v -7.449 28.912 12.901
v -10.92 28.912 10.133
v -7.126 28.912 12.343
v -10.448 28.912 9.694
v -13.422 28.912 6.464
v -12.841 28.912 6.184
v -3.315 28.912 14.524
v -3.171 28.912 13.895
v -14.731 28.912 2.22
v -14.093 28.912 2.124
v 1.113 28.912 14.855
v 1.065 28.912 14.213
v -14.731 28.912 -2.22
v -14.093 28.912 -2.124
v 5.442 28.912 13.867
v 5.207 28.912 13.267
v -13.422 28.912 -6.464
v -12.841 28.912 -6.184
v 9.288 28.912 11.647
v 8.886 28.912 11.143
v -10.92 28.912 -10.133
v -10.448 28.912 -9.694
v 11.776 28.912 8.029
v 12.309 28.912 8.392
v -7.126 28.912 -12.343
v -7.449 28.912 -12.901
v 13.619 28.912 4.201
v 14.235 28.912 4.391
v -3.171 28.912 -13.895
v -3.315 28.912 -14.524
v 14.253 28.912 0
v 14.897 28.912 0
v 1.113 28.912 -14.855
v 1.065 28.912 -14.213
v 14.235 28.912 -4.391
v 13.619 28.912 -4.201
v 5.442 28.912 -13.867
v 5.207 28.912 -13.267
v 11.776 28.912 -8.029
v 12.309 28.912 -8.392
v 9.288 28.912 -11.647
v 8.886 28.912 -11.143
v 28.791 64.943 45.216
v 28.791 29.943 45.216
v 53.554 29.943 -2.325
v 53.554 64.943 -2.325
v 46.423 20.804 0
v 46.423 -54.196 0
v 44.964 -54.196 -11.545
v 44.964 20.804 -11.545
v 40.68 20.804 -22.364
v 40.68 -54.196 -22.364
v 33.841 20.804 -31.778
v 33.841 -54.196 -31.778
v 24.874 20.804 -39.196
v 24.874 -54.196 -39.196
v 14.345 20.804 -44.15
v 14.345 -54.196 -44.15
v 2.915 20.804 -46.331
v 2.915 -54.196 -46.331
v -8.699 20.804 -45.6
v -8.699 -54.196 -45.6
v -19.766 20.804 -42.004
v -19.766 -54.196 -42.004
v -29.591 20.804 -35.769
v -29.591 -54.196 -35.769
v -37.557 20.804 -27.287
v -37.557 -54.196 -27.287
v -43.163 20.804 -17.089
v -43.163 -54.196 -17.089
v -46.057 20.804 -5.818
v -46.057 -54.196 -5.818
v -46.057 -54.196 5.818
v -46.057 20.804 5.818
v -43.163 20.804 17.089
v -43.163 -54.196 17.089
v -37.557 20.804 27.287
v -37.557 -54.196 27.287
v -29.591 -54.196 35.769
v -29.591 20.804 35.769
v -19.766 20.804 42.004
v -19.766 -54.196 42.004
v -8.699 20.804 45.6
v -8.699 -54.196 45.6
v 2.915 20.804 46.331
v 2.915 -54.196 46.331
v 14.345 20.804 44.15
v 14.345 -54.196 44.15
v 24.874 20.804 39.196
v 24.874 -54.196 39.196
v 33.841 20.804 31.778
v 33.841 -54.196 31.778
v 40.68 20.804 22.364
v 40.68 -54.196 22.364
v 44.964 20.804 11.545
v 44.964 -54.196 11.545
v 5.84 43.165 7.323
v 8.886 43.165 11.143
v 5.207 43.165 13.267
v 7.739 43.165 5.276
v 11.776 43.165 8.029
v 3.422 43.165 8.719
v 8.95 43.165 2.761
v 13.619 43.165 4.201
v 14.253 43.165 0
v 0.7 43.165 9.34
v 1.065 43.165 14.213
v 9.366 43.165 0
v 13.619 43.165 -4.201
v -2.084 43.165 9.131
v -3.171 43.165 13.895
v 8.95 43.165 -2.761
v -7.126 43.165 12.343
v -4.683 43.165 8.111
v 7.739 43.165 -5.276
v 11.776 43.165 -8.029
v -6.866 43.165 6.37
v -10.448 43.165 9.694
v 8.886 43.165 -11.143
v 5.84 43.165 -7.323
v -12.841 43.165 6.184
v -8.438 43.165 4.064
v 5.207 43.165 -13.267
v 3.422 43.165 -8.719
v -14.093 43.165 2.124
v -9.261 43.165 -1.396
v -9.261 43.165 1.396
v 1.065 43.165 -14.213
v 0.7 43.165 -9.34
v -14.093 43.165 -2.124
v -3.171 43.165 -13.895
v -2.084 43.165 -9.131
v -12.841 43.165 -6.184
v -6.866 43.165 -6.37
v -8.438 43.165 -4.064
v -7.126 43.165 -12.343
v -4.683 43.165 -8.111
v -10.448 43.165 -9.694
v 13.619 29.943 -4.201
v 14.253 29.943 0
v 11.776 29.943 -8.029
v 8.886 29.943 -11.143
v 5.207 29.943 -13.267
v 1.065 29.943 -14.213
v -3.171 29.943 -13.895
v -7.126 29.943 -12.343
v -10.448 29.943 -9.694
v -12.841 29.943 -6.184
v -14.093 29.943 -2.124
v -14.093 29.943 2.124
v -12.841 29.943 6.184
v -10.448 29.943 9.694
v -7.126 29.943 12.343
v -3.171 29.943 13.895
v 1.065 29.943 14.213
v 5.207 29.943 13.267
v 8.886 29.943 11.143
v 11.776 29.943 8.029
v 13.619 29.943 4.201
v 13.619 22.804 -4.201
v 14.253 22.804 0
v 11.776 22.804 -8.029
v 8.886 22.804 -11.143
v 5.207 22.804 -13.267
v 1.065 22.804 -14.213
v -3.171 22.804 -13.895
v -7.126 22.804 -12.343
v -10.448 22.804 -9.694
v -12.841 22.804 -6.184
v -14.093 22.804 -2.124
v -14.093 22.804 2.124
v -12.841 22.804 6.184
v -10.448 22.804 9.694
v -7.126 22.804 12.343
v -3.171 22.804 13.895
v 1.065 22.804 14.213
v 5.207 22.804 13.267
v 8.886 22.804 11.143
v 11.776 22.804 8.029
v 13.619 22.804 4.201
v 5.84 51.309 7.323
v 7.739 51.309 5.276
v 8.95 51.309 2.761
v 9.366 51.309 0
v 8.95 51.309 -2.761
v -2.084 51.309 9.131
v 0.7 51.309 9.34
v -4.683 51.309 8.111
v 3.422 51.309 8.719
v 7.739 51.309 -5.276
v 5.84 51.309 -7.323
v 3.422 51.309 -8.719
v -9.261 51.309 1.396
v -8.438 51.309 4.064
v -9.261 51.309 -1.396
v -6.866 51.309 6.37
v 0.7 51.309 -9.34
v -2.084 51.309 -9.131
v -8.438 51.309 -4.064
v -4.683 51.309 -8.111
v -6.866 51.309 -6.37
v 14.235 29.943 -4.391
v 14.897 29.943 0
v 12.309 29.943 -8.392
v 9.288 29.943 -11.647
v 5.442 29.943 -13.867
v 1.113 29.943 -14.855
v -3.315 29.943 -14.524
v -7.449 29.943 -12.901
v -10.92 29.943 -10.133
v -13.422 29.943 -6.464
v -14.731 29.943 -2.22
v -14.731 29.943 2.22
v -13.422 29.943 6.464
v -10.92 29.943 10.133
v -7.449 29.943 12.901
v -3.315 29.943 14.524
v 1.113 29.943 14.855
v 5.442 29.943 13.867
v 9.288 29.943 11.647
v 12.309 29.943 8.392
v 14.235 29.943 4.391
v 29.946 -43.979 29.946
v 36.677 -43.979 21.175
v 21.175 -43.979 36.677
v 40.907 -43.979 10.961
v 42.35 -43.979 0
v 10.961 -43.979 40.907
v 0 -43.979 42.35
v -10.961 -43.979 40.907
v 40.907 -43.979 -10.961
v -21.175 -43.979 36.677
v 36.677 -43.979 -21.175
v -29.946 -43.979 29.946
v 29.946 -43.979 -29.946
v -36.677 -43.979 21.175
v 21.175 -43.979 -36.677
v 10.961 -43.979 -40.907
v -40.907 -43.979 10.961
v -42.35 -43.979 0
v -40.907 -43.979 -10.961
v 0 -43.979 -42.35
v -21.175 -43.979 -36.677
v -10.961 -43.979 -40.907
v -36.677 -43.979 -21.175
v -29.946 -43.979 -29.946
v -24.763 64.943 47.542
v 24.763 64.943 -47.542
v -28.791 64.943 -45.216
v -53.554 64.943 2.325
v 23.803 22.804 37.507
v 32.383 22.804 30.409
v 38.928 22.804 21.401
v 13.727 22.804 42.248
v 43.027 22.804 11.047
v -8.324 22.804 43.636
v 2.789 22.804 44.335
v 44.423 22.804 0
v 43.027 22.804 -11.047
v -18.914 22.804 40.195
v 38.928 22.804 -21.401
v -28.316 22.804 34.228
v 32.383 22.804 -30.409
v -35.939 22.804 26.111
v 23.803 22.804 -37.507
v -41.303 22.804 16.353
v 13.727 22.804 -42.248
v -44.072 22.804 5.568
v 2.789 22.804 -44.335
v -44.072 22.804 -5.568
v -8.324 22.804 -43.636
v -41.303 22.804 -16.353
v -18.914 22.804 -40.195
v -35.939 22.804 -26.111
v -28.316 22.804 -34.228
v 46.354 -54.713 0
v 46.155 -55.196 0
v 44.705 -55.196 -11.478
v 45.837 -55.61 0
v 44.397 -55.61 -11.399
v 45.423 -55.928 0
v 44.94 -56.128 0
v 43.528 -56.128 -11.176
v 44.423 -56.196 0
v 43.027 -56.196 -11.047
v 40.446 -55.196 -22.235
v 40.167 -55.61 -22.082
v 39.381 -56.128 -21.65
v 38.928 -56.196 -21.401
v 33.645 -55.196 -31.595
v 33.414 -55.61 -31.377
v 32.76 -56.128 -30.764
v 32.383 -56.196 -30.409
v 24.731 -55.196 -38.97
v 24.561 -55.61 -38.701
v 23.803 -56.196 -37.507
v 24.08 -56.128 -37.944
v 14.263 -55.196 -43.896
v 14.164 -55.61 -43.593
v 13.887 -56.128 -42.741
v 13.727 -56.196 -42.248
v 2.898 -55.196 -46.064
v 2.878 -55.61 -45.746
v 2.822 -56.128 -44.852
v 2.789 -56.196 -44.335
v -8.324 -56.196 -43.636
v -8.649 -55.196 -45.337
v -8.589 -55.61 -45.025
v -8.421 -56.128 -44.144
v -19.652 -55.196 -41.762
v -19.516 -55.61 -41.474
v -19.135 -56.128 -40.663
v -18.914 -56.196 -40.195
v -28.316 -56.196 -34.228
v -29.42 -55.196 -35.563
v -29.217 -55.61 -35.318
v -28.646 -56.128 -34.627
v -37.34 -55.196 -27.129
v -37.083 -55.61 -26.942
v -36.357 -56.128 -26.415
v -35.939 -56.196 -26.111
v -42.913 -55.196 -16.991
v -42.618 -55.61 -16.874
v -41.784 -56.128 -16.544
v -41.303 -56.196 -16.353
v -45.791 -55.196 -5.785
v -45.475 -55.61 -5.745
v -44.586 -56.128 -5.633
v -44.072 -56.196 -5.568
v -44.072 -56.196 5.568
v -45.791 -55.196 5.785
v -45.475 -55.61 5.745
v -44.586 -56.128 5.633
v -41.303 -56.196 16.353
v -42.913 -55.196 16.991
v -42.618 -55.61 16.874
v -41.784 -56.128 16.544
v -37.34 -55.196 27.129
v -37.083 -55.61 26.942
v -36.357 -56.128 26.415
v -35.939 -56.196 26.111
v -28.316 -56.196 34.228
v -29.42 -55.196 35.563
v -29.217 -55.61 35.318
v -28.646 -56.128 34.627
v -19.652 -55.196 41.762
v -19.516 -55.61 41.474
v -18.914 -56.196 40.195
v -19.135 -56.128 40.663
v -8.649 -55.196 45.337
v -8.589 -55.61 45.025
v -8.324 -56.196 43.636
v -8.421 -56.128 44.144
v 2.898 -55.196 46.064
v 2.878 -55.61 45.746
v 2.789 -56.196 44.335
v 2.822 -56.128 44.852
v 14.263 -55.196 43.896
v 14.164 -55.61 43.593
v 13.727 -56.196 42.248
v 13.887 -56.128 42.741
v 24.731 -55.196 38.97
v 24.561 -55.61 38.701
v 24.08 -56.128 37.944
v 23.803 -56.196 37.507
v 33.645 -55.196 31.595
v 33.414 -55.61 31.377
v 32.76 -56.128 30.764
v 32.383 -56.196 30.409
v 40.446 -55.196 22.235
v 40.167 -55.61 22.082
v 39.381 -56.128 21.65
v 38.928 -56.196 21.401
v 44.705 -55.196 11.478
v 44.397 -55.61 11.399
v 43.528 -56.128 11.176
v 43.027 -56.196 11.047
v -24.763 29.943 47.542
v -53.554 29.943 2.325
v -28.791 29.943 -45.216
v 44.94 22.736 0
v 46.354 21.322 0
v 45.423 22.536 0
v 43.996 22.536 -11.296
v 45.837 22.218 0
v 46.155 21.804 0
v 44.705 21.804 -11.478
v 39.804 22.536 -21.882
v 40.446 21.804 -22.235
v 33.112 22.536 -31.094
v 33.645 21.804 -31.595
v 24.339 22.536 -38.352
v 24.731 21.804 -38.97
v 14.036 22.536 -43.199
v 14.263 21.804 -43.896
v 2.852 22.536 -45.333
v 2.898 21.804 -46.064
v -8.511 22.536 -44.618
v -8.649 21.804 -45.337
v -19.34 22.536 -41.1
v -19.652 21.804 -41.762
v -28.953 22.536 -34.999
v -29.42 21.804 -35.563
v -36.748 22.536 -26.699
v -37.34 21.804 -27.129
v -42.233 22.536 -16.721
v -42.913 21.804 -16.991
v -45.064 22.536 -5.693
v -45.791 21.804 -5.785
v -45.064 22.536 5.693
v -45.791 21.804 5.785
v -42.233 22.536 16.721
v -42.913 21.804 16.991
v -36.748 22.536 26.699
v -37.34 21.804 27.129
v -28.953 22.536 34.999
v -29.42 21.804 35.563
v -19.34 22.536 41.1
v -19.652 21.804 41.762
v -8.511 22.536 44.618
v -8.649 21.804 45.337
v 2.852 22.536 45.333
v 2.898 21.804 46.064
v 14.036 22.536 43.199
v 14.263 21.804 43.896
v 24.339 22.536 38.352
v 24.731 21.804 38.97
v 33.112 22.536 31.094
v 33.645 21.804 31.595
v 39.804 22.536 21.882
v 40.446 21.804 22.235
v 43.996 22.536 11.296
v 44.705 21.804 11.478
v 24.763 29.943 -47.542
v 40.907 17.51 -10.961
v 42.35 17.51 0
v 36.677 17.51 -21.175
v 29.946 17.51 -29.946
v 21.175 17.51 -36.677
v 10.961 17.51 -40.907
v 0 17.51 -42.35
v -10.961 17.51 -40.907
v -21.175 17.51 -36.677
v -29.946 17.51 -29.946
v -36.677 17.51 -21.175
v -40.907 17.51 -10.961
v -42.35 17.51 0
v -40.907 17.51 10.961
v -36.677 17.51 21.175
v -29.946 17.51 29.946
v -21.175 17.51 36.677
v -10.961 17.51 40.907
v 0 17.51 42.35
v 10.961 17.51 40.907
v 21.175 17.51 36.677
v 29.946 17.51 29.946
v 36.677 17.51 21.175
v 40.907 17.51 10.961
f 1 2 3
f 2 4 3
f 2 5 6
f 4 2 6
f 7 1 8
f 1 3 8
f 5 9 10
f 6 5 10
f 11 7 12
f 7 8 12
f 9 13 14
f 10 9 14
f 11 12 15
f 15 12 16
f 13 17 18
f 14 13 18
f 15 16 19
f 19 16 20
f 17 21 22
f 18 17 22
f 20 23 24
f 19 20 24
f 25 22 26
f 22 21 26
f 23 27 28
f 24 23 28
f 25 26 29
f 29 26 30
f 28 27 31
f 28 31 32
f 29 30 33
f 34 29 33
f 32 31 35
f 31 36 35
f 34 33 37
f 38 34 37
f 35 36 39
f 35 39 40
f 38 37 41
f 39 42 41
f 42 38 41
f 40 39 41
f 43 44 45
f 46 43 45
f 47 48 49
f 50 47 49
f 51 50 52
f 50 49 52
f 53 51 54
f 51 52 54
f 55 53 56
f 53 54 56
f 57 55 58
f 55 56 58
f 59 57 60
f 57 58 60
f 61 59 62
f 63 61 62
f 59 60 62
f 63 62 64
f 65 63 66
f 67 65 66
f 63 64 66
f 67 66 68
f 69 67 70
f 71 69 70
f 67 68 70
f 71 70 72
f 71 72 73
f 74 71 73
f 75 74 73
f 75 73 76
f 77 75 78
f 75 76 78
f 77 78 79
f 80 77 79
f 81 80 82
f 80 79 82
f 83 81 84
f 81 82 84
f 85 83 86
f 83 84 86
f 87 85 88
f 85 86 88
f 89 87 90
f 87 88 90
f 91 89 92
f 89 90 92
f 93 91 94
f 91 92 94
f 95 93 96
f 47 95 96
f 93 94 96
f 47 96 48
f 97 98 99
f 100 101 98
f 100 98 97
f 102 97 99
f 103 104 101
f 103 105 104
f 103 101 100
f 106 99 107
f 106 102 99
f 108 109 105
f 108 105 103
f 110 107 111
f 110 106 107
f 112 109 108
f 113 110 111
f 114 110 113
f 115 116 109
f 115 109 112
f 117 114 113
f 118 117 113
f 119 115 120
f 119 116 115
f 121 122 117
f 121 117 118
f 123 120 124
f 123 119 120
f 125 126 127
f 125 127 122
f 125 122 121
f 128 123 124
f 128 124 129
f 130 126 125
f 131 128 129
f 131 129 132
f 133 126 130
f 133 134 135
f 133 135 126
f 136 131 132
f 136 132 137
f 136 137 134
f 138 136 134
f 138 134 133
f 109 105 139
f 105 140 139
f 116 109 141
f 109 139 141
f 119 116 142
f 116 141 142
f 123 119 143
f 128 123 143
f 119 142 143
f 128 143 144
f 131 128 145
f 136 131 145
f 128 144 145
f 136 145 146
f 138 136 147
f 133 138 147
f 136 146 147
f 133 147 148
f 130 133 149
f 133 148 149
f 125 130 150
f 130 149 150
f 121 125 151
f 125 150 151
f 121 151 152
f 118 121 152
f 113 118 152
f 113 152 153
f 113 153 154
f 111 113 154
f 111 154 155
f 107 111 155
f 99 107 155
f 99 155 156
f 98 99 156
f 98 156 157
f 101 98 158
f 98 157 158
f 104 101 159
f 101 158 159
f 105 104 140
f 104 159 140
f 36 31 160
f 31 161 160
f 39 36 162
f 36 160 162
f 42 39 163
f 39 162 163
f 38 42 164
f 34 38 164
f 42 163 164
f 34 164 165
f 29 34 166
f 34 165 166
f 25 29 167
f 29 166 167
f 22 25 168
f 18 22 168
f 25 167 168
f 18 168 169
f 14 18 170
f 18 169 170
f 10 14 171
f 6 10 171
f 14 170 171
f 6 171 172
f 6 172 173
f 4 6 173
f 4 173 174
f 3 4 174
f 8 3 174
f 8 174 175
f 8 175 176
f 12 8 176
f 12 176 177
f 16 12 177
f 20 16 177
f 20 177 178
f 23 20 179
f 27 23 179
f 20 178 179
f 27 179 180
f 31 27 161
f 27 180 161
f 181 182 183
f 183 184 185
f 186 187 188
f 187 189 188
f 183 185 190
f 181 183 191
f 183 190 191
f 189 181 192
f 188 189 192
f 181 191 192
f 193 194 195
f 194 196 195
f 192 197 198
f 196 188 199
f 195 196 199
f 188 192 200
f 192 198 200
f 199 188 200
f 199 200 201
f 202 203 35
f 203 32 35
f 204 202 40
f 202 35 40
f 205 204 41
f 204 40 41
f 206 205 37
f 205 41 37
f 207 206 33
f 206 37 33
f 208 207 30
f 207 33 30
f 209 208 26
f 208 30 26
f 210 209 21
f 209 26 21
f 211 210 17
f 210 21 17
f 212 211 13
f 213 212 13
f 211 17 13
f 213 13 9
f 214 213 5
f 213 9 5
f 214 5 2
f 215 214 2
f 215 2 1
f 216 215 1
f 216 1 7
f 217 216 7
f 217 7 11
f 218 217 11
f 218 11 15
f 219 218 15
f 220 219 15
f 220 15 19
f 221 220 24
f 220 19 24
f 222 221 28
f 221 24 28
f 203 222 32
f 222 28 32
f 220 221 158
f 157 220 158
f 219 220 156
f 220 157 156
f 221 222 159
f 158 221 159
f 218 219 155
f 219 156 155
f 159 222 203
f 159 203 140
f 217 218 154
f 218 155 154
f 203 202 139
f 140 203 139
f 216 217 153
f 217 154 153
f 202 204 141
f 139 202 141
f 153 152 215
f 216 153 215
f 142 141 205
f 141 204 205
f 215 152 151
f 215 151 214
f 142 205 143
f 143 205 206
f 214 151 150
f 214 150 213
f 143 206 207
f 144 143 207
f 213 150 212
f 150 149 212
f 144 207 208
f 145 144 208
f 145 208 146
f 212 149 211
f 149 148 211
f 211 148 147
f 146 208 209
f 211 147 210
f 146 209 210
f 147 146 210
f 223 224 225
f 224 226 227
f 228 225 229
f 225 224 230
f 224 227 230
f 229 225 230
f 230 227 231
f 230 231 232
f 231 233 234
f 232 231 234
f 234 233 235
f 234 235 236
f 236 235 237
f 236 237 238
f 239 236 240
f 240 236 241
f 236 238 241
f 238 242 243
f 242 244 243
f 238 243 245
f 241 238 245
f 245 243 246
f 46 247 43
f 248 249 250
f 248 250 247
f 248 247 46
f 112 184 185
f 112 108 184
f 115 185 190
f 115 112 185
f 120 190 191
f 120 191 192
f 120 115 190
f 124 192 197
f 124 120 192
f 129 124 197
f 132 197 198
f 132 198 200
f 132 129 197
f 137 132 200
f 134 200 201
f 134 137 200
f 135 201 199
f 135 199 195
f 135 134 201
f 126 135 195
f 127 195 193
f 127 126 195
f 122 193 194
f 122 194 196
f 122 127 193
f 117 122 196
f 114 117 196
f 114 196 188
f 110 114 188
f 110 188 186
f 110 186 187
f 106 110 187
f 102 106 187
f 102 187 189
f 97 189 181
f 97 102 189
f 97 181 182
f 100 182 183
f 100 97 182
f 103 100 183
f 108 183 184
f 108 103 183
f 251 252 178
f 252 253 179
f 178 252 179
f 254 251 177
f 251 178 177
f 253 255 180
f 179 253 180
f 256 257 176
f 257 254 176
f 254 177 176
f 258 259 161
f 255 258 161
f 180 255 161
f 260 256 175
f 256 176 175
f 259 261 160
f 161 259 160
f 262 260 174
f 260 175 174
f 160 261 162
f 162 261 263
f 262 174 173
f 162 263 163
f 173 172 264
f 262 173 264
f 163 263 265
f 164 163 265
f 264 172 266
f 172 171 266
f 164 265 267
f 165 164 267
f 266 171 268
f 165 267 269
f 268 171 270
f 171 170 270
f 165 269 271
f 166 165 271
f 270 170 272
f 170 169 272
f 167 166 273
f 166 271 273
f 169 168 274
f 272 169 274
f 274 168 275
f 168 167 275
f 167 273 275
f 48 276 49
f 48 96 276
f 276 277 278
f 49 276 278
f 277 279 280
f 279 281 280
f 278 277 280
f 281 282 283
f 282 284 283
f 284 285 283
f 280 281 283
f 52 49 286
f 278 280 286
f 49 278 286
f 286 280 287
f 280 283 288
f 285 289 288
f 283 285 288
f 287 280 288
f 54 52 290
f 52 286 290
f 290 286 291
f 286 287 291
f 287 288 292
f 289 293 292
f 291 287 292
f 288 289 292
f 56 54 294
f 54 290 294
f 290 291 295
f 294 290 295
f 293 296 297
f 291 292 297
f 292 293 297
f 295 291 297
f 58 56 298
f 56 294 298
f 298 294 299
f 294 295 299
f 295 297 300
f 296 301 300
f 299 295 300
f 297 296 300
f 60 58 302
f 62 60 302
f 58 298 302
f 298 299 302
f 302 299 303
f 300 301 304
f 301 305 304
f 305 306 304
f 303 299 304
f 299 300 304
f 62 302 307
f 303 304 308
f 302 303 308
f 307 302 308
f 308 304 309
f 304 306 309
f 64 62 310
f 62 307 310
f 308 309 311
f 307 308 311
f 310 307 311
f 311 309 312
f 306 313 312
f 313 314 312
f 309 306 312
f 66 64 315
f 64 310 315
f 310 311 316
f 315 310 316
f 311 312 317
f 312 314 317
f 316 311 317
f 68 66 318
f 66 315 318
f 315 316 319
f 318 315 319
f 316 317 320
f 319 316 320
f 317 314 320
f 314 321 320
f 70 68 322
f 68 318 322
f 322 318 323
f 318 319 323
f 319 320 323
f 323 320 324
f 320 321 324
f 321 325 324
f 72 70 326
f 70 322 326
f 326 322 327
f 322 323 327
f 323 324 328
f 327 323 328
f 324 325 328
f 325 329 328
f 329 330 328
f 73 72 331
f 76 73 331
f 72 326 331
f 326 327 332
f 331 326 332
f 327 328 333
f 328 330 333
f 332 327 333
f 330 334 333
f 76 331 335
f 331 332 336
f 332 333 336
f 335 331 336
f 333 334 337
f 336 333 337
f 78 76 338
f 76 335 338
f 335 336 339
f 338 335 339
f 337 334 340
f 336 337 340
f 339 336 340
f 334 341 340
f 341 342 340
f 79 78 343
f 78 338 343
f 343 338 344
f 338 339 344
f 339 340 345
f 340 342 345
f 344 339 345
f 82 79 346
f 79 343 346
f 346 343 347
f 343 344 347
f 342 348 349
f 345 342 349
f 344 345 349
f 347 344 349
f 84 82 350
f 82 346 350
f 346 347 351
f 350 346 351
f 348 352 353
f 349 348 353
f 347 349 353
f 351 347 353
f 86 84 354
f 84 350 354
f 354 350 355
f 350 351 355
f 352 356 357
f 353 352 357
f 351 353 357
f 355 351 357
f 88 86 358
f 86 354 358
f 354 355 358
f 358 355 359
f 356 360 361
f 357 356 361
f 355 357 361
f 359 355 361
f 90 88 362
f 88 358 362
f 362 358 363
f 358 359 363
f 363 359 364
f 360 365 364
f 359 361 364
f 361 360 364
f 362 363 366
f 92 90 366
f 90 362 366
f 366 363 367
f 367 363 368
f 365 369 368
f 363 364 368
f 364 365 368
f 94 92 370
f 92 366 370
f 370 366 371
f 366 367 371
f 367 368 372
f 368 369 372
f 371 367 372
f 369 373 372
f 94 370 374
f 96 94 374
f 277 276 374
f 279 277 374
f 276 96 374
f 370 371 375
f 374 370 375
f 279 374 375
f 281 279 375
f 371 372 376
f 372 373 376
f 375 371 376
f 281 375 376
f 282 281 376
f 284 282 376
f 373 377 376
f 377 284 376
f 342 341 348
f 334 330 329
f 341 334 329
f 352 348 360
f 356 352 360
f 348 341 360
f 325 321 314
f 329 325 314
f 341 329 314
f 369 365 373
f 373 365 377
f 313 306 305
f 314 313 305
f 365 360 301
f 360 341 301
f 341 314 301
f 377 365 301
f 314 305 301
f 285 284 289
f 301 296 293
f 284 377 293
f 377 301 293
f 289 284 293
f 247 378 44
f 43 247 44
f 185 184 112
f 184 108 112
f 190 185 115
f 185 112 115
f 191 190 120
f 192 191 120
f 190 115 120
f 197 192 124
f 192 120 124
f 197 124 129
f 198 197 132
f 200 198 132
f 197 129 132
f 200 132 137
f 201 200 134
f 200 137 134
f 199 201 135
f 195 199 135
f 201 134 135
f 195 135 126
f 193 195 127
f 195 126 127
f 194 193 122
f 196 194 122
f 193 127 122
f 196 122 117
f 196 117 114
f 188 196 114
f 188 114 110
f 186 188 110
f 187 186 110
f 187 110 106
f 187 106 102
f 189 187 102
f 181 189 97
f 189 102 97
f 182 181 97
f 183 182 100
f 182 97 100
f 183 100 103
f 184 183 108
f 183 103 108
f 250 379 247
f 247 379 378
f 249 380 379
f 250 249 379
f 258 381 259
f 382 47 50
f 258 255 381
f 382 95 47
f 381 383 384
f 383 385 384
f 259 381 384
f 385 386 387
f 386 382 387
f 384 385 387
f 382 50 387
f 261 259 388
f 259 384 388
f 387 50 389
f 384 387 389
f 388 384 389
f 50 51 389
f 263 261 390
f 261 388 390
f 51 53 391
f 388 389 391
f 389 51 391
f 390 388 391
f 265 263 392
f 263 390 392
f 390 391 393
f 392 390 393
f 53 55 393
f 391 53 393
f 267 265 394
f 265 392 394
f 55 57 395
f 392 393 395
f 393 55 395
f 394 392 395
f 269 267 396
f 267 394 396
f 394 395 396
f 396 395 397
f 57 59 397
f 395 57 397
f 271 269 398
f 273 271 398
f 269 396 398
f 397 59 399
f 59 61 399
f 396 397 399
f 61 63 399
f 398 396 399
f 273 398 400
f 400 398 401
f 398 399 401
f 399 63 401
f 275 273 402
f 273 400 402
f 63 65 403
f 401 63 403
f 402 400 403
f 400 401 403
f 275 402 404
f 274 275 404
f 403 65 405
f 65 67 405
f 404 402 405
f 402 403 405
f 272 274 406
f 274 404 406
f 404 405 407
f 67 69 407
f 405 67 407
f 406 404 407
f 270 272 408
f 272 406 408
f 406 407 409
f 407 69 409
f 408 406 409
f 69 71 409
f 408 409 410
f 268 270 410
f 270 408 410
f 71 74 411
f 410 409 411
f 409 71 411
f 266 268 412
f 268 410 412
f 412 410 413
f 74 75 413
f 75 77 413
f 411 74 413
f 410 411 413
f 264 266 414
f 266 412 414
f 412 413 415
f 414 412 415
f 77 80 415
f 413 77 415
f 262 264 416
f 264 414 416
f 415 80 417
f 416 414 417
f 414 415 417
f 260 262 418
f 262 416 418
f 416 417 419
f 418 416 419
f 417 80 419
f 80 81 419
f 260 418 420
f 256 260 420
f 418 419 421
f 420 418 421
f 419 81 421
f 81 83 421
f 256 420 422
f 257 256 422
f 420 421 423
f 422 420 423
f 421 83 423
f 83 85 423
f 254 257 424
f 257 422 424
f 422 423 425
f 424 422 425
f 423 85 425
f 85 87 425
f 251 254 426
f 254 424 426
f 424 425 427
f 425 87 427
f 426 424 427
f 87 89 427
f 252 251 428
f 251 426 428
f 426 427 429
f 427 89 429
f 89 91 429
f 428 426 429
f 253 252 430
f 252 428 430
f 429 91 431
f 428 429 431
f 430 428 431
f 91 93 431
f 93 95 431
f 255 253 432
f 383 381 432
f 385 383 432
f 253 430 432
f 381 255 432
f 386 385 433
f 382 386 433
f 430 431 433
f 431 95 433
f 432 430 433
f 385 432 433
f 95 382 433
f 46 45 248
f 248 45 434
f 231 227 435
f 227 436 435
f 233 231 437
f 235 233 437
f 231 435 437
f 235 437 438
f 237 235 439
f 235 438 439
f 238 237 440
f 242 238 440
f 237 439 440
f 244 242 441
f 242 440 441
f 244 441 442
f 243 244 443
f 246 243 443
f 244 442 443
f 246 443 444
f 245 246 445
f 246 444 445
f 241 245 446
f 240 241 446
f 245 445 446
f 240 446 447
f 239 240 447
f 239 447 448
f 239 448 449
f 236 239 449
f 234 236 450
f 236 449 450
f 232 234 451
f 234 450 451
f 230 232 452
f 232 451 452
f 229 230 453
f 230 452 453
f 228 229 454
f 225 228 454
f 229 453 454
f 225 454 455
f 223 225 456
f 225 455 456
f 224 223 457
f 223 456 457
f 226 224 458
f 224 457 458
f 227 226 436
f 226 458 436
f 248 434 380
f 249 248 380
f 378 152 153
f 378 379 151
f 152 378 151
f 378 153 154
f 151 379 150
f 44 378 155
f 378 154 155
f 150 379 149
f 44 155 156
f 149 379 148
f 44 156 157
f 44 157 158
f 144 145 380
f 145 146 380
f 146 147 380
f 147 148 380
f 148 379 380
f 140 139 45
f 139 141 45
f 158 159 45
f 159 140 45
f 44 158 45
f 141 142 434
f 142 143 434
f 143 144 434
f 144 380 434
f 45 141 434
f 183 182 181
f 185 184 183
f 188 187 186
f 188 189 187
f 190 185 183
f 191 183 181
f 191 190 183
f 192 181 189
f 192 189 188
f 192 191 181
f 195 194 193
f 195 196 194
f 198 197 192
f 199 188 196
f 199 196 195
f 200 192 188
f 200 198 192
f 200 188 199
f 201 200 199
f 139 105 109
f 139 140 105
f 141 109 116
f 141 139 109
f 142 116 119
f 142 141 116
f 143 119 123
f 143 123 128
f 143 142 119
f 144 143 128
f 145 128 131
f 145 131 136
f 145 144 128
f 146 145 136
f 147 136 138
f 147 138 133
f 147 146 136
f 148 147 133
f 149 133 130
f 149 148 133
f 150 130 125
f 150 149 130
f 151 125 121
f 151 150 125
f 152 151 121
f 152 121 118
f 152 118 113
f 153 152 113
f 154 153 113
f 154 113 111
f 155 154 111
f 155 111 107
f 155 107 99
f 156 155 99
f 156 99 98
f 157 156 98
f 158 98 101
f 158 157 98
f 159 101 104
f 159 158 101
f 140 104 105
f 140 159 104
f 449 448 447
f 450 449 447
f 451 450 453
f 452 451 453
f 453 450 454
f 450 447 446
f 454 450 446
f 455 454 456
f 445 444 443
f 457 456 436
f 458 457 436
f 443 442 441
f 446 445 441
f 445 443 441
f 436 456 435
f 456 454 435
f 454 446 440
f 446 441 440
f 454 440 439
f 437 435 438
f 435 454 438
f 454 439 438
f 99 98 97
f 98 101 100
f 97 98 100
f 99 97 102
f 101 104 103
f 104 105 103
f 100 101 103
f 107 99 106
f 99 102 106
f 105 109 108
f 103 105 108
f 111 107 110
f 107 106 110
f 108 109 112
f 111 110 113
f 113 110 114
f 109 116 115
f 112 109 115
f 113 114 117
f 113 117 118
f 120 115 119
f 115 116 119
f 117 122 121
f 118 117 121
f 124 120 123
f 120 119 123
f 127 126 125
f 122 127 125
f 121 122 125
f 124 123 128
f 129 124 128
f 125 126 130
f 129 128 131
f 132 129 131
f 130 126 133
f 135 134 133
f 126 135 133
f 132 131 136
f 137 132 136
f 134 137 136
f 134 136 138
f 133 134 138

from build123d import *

# Parameters (mm, degrees)
FILLET1_R           = 2
BOSS_EXTRUDE1_DEPTH = 35


with BuildPart() as part:
    # Sketch1 → Revolve1 (revolve)
    with BuildSketch(Plane.XY):
        Polygon((0, 51.309168584), (9.365959345, 51.309168584), (9.365959345, 43.16485611), (14.252546829, 43.16485611), (14.252546829, 29.943316963), (14.897026355, 29.943316963), (14.897026355, 28.912309281), (14.252546829, 28.912309281), (14.252546829, 22.804074926), (46.422581099, 22.804074926), (46.422581099, -56.195756068), (0, -56.195756068), (0, -43.979287357), (42.350424863, -43.979287357), (42.350424863, 17.510271818), (0, 17.510271818), align=None)
    revolve(axis=Axis((0, 17.510271818, 0), (0, 1, 0)))

    # Fillet1
    fillet1_edges = [part.edges().sort_by_distance(p)[0] for p in [
        (-46.422581099, -56.195756068, 0),
        (-46.422581099, 22.804074926, 0),
    ]]
    fillet(fillet1_edges, radius=FILLET1_R)


with BuildPart() as body_2:
    # Sketch2 → Boss-Extrude1 (new body)
    with BuildSketch(Plane(origin=(0, 29.943316963, 0), x_dir=(1, 0, 0), z_dir=(0, 1, 0))):
        Polygon((28.790711038, -45.216180797), (53.553716751, 2.325396753), (24.763005713, 47.54157755), (-28.790711038, 45.216180797), (-53.553716751, -2.325396753), (-24.763005713, -47.54157755), align=None)
    extrude(amount=BOSS_EXTRUDE1_DEPTH)

    # Sketch1<2> → Cut-Revolve1 (revolve, cut)
    with BuildSketch(Plane.XY):
        Polygon((0, 51.309168584), (9.365959345, 51.309168584), (9.365959345, 43.16485611), (14.252546829, 43.16485611), (14.252546829, 29.943316963), (14.897026355, 29.943316963), (14.897026355, 28.912309281), (14.252546829, 28.912309281), (14.252546829, 22.804074926), (46.422581099, 22.804074926), (46.422581099, -56.195756068), (0, -56.195756068), (0, -43.979287357), (42.350424863, -43.979287357), (42.350424863, 17.510271818), (0, 17.510271818), align=None)
    revolve(axis=Axis((0, 17.510271818, 0), (0, 1, 0)), mode=Mode.SUBTRACT)


solid = Compound([part.part, body_2.part])
